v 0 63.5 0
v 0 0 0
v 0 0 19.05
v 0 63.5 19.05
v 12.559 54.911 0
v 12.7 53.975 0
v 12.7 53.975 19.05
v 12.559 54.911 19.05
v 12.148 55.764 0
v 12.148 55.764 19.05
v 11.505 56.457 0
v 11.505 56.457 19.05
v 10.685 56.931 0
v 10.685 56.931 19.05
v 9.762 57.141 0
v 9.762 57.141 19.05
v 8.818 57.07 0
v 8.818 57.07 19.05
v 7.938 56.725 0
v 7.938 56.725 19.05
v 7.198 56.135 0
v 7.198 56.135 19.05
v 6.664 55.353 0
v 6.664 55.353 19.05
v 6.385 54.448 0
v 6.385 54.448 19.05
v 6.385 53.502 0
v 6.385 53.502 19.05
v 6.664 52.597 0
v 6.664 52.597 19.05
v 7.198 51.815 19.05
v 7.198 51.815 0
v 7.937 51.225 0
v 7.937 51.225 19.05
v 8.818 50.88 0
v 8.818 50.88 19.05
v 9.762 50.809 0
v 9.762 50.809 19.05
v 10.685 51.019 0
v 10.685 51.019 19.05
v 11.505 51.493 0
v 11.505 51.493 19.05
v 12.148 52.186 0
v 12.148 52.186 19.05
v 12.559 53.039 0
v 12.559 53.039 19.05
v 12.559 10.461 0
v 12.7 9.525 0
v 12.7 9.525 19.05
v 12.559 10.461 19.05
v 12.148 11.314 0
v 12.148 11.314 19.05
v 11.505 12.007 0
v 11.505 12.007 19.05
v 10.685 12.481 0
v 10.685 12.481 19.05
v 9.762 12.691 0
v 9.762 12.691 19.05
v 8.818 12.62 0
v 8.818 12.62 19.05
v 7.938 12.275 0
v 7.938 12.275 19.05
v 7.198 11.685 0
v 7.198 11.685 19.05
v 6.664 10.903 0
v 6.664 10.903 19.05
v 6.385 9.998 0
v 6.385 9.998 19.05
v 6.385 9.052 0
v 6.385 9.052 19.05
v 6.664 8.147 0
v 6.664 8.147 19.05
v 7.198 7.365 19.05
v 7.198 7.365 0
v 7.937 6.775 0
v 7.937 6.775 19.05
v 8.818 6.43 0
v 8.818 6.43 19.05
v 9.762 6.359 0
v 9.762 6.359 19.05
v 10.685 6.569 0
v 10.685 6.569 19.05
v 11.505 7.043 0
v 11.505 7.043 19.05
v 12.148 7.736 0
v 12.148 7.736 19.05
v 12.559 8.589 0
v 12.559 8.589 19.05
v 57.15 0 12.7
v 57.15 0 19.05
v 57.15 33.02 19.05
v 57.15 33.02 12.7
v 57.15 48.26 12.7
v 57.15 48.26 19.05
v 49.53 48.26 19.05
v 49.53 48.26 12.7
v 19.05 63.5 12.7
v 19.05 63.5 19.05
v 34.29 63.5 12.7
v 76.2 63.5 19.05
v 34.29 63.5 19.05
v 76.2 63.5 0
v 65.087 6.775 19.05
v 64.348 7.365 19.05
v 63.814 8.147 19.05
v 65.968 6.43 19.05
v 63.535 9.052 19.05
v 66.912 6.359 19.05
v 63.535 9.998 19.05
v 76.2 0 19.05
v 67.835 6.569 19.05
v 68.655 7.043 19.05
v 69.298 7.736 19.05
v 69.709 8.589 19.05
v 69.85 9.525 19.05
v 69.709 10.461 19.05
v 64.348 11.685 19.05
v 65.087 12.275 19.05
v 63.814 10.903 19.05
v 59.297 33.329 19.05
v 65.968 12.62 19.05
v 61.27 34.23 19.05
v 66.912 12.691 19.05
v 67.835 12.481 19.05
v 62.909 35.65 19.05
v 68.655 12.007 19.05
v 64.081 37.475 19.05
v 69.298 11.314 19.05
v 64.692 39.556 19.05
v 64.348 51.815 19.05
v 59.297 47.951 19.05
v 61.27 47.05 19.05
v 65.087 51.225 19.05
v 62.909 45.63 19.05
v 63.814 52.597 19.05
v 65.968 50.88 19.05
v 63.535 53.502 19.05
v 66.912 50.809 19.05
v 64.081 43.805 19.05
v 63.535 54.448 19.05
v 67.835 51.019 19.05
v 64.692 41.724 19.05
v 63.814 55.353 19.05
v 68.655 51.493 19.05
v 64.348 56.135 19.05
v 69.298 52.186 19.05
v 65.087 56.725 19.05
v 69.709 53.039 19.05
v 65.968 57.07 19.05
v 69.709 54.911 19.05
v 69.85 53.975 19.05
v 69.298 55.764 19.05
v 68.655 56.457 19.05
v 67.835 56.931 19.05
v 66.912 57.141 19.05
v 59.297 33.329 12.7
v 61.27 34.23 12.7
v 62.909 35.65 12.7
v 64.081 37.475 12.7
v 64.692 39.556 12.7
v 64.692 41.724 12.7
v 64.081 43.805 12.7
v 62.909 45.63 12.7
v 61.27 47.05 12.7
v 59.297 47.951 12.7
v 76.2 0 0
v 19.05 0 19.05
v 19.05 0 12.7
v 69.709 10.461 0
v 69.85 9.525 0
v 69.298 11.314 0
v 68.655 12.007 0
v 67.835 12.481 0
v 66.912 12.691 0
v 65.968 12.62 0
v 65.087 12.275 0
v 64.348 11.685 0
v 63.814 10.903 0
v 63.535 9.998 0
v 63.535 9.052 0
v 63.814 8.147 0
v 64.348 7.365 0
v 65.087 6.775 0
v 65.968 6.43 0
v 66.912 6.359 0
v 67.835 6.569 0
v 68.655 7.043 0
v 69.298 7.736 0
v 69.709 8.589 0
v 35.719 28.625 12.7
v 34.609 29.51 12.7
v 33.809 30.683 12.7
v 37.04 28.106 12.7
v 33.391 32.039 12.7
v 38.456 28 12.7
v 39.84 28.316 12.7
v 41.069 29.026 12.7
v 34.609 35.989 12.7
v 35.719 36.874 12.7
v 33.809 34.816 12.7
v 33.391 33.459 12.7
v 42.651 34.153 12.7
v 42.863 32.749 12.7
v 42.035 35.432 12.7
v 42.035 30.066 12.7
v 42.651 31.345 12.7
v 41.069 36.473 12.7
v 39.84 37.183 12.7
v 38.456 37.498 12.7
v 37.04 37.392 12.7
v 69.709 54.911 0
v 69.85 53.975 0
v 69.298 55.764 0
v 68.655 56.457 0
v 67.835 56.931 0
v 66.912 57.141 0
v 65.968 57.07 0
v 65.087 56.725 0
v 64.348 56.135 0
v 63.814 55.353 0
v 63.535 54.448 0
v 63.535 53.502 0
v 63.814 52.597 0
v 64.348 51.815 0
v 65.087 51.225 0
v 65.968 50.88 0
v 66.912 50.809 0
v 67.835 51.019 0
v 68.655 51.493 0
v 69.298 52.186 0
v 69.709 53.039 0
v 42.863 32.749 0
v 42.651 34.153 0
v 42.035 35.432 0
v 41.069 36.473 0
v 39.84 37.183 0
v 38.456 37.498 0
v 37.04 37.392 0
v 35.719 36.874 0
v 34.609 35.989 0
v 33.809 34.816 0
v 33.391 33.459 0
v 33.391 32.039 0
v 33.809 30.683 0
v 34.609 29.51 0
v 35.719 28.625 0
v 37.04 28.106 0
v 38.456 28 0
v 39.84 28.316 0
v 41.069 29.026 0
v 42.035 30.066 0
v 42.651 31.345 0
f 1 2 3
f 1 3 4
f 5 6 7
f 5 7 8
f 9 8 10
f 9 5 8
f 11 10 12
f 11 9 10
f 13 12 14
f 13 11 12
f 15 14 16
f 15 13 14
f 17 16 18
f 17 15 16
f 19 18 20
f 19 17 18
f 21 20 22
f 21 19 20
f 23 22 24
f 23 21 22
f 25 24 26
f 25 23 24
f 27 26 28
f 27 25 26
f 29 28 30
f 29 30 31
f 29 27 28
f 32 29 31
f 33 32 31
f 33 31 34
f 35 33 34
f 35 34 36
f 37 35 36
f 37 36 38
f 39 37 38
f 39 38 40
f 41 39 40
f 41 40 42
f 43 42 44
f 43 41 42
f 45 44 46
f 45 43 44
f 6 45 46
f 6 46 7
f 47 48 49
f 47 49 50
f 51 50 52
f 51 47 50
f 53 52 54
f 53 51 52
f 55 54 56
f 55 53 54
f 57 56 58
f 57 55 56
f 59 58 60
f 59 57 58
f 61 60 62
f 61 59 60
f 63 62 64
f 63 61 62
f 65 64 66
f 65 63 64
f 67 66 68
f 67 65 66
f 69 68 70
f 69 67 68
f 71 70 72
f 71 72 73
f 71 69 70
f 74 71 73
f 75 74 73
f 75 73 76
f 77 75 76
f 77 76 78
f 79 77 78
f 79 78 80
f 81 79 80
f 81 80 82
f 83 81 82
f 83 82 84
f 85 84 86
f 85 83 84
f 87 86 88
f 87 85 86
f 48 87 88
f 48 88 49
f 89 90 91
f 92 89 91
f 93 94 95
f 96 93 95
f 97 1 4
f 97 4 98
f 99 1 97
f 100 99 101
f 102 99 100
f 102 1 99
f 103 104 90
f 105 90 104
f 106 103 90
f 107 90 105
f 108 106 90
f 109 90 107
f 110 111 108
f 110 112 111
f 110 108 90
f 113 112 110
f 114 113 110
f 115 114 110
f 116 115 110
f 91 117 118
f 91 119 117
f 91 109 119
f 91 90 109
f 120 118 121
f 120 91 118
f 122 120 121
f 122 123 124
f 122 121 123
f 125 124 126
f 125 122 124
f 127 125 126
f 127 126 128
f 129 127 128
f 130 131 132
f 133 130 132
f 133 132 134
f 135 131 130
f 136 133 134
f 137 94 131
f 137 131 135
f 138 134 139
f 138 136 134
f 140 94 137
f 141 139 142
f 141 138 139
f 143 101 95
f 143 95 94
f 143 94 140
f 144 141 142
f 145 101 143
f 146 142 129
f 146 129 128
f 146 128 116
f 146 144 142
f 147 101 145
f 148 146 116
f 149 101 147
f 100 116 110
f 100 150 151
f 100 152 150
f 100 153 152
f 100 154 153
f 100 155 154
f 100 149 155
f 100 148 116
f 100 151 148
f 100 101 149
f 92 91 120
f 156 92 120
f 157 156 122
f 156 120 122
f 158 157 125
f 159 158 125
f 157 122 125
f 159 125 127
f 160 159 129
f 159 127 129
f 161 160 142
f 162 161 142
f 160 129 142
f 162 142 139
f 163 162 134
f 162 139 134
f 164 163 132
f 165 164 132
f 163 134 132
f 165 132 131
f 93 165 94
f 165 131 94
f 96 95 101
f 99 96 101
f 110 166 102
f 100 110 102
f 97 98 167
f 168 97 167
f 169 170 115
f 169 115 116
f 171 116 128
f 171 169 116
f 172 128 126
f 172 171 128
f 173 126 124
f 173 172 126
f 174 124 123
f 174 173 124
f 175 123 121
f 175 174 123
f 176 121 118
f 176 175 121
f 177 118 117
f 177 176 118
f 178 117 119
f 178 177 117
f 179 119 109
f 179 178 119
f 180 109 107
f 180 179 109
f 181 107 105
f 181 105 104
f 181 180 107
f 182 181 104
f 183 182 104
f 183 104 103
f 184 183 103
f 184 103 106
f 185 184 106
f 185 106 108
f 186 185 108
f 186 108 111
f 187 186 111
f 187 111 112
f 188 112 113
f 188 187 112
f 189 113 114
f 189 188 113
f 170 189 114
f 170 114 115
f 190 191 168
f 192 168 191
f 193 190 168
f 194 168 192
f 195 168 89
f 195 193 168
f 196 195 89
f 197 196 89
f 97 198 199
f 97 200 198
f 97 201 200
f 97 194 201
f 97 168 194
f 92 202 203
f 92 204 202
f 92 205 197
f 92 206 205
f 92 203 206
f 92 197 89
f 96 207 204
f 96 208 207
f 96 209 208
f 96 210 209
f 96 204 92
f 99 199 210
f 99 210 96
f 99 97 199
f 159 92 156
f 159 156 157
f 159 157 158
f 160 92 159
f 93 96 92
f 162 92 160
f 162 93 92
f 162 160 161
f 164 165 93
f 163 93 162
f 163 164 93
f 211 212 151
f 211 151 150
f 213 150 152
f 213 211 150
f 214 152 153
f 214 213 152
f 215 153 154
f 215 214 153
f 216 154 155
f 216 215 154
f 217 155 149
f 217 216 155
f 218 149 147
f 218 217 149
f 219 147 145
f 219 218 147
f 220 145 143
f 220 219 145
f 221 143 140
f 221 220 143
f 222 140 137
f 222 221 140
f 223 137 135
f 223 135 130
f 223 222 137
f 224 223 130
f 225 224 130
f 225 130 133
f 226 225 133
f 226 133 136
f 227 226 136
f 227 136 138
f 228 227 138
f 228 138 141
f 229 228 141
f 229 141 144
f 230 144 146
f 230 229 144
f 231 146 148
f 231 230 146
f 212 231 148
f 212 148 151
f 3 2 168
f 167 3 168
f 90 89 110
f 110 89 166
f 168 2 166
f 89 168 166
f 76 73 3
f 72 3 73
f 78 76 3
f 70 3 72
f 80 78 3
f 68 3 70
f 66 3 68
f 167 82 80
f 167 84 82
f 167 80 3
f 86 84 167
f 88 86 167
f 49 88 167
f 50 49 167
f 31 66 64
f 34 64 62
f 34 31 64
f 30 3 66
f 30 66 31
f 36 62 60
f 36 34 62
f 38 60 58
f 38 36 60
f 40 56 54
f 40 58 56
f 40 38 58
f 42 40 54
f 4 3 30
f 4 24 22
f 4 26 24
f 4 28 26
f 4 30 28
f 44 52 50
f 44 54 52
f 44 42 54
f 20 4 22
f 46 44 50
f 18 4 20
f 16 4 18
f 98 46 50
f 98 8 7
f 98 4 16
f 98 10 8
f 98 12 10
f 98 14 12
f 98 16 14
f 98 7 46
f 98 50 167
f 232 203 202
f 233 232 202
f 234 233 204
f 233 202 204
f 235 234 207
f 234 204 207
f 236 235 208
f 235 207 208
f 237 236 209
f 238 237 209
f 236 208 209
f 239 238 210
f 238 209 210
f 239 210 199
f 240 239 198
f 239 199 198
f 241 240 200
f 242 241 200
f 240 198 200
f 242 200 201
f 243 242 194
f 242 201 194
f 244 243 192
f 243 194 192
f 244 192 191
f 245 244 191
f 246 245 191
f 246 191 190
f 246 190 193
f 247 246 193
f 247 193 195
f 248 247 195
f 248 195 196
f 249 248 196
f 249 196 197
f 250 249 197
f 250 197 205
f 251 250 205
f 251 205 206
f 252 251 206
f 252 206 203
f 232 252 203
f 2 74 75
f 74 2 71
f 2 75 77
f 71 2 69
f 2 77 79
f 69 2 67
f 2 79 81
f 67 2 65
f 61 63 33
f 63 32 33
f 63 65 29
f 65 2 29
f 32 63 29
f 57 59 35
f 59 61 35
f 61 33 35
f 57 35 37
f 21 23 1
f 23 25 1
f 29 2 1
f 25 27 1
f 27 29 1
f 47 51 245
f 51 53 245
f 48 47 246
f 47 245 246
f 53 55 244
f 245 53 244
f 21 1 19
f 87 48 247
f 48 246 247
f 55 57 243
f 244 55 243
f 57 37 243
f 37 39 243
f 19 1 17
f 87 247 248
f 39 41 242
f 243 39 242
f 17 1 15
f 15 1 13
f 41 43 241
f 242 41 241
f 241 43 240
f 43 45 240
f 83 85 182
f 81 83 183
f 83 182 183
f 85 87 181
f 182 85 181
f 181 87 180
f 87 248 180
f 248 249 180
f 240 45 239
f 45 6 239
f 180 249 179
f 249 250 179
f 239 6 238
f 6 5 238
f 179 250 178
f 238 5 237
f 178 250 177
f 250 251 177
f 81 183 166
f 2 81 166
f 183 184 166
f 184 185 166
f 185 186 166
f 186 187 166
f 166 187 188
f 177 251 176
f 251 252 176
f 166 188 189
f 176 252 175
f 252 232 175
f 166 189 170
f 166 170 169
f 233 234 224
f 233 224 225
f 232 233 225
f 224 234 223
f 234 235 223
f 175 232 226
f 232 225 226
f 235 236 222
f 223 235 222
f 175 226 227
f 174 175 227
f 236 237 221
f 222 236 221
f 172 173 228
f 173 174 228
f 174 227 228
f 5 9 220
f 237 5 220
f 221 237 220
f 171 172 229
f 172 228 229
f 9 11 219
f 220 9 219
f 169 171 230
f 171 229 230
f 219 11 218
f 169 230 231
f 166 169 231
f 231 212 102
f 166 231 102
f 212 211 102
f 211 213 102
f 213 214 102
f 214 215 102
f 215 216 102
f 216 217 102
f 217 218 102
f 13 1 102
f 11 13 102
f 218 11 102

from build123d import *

# Parameters (mm, degrees)
F0_W     = 76.2
F0_H     = 63.5
F0_R     = 3.175
F1_DEPTH = 19.05
F2_R     = 4.7625
F3_DEPTH = 6.35
F4_R     = 4.7625
F5_DEPTH = 12.701


with BuildPart() as f1:
    # F0 (on Top) → F1 (new body)
    with BuildSketch(Plane.XY):
        with Locations((38.1, 31.75)):
            Rectangle(F0_W, F0_H)
        with Locations((9.525, 9.525)):
            Circle(F0_R, mode=Mode.SUBTRACT)
        with Locations((66.675, 9.525)):
            Circle(F0_R, mode=Mode.SUBTRACT)
        with Locations((9.525, 53.975)):
            Circle(F0_R, mode=Mode.SUBTRACT)
        with Locations((66.675, 53.975)):
            Circle(F0_R, mode=Mode.SUBTRACT)
    extrude(amount=F1_DEPTH)

    # F2 (on face) → F3 (cut)
    with BuildSketch(Plane.XY.offset(19.05)):
        with BuildLine():
            Line((19.05, 63.5), (19.05, 0))
            Line((19.05, 0), (57.15, 0))
            Line((57.15, 0), (57.15, 33.02))
            ThreePointArc((57.15, 33.02), (64.77, 40.64), (57.15, 48.26))
            Line((57.15, 48.26), (49.53, 48.26))
            Line((49.53, 48.26), (34.29, 63.5))
            Line((34.29, 63.5), (19.05, 63.5))
        make_face()
        with Locations((38.1, 32.749232)):
            Circle(F2_R, mode=Mode.SUBTRACT)
        with Locations((38.1, 32.749232)):
            Circle(F2_R)
    extrude(amount=-F3_DEPTH, mode=Mode.SUBTRACT)

    # F4 (on face) → F5 (cut, through all)
    with BuildSketch(Plane.XY.offset(12.7)):
        with Locations((38.1, 32.749232)):
            Circle(F4_R)
    extrude(amount=-F5_DEPTH, mode=Mode.SUBTRACT)


solid = f1.part
